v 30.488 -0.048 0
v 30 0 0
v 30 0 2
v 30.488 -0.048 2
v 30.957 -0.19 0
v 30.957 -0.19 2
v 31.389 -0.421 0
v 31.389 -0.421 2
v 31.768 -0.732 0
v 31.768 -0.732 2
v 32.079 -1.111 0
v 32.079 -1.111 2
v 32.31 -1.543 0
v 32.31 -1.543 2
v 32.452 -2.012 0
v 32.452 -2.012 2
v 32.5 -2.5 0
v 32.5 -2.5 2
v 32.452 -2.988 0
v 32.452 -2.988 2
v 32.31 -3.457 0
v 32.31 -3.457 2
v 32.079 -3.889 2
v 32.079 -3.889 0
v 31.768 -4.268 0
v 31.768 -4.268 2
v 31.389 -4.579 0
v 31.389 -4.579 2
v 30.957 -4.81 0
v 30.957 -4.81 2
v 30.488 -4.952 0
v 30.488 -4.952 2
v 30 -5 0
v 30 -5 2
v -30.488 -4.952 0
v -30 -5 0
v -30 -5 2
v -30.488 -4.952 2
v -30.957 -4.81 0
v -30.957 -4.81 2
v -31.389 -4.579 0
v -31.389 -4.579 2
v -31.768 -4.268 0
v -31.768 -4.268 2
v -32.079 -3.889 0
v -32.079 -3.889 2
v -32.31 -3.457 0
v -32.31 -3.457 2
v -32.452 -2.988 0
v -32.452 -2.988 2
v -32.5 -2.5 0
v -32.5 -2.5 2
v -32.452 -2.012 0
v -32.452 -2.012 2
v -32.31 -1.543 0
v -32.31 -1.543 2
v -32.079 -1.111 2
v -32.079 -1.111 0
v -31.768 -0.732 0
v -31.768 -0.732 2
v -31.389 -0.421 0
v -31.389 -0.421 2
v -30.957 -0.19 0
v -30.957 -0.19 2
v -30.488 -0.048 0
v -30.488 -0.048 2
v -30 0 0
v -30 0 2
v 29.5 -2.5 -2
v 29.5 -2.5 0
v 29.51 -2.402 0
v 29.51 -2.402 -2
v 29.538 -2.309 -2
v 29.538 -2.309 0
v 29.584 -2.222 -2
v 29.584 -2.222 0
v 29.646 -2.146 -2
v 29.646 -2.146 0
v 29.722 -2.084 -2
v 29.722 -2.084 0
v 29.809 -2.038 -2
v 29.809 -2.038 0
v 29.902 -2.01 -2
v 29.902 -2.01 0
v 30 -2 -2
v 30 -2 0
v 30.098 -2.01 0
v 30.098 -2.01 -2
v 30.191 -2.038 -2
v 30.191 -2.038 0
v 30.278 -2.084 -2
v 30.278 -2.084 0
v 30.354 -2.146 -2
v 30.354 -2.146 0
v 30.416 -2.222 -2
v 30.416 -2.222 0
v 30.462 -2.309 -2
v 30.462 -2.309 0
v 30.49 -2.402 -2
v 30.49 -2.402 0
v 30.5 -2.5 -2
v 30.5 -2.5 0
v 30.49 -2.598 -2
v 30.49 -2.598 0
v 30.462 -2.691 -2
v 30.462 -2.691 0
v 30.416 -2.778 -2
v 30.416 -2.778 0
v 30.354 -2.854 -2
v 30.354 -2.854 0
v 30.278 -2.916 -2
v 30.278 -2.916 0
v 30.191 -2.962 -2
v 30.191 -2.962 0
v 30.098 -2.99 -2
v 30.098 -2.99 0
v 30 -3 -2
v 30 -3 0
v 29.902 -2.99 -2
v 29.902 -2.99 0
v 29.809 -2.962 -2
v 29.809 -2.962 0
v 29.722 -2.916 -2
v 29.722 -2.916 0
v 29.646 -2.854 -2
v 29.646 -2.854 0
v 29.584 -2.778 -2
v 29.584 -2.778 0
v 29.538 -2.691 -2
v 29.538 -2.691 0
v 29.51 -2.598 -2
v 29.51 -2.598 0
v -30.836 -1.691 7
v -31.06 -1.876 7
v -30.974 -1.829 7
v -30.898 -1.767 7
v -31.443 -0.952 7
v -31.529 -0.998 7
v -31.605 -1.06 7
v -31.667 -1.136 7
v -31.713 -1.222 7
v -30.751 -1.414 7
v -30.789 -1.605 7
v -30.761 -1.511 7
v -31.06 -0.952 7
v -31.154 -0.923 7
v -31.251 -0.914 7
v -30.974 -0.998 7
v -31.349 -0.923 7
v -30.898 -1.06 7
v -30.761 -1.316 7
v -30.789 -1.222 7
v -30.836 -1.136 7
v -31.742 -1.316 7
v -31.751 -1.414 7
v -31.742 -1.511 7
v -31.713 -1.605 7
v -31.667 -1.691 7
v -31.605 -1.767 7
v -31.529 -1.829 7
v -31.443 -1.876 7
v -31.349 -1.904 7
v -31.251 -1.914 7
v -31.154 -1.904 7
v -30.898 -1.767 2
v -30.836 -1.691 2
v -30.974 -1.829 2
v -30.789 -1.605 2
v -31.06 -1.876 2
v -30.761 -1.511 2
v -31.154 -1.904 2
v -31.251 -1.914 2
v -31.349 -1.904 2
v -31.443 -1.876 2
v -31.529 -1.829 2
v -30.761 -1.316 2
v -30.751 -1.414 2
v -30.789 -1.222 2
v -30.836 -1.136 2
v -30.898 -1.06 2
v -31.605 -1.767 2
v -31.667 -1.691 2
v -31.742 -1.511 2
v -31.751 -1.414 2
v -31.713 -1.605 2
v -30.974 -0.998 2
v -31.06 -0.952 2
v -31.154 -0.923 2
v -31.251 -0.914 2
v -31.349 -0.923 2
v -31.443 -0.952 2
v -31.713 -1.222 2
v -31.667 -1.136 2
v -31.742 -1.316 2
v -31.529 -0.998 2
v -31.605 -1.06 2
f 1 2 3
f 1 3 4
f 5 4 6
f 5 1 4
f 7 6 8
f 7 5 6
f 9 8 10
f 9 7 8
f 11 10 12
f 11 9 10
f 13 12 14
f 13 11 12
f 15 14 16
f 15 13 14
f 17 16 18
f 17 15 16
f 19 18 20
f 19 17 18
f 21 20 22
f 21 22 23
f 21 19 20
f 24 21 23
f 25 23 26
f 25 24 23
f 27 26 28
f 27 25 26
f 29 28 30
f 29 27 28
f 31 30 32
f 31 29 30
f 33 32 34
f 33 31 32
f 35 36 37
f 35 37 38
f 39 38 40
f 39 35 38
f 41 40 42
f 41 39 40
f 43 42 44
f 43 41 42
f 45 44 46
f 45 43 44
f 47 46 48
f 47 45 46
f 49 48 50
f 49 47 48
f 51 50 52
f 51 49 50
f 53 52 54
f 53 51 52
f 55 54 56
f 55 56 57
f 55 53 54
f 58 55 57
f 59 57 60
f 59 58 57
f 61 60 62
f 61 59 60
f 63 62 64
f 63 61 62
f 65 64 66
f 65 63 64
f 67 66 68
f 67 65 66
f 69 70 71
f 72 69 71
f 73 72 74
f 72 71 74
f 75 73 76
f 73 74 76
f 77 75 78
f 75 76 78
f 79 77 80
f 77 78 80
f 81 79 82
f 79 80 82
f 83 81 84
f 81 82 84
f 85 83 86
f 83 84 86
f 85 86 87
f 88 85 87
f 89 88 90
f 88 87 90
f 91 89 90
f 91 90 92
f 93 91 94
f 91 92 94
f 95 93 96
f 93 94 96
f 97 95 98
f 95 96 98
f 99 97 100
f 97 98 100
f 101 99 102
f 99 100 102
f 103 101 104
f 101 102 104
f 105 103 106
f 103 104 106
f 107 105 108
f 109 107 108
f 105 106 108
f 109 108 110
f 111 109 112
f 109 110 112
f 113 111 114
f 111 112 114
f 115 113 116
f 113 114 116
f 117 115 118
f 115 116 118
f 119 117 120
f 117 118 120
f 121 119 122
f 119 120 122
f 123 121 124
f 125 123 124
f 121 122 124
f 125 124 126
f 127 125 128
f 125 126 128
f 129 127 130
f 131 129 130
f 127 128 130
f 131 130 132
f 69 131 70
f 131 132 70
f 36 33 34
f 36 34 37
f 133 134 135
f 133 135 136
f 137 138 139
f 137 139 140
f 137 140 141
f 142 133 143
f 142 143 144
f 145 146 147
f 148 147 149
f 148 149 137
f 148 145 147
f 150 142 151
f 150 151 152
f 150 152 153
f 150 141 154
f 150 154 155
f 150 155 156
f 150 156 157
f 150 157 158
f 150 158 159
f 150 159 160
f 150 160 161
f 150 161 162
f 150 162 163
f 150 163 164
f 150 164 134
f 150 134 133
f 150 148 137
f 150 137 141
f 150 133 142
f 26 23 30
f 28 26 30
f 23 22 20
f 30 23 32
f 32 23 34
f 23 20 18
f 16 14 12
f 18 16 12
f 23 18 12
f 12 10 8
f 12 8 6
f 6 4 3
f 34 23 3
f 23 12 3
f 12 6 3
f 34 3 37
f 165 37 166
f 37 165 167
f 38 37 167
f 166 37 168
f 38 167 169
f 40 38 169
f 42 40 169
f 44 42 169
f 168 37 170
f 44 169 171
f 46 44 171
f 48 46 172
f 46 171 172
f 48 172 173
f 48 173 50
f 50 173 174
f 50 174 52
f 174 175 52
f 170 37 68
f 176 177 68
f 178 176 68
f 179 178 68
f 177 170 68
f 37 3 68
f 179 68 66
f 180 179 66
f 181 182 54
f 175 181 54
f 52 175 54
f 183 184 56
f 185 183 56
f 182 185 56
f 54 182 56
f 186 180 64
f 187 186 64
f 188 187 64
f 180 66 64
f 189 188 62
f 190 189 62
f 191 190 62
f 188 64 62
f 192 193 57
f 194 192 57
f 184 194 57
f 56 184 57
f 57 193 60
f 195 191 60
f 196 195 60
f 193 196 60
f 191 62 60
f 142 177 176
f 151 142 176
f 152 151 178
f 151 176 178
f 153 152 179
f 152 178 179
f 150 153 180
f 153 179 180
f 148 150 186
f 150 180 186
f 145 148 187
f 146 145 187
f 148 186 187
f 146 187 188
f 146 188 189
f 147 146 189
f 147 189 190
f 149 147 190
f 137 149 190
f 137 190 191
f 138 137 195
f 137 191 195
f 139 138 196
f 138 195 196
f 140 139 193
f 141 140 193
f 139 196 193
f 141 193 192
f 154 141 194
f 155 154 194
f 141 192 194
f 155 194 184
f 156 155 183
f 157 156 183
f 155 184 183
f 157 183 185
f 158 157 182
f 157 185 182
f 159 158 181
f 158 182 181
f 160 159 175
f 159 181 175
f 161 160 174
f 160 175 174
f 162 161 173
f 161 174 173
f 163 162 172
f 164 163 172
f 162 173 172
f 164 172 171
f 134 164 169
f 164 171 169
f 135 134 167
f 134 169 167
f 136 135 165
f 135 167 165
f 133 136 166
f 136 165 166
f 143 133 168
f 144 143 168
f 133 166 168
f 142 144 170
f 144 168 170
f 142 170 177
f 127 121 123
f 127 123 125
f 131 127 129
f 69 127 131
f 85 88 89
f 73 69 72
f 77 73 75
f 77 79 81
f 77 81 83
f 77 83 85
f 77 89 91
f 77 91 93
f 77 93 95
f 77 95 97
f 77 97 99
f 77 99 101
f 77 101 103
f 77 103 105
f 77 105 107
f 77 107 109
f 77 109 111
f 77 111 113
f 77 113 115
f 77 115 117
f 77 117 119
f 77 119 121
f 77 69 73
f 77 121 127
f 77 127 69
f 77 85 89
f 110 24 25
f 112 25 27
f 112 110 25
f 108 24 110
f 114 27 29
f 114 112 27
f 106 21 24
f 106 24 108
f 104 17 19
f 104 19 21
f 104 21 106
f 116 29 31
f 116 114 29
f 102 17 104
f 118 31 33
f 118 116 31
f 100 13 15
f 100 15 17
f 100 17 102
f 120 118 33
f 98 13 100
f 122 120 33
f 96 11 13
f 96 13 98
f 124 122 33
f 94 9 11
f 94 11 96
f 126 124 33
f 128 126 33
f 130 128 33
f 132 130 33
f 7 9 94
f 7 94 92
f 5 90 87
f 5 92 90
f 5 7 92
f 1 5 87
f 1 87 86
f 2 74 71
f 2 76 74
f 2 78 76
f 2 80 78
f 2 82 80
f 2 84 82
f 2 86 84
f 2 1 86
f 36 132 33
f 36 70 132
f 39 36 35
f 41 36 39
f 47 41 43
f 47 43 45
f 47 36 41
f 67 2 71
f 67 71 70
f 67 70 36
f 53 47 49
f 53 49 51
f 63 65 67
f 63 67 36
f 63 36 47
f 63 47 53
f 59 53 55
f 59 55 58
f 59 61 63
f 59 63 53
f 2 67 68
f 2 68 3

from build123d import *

# Parameters (mm, degrees)
BOSS_EXTRUDE1_DEPTH = 2
SKETCH2_R           = 0.5
BOSS_EXTRUDE2_DEPTH = 2
SKETCH3_R           = 0.5
BOSS_EXTRUDE3_DEPTH = 5


with BuildPart() as part:
    # Sketch1 → Boss-Extrude1 (new body)
    with BuildSketch(Plane.XY):
        with BuildLine():
            Line((-30, 0), (30, 0))
            ThreePointArc((30, 0), (32.5, -2.5), (30, -5))
            Line((30, -5), (-30, -5))
            ThreePointArc((-30, -5), (-32.5, -2.5), (-30, 0))
        make_face()
    extrude(amount=BOSS_EXTRUDE1_DEPTH)

    # Sketch2 → Boss-Extrude2 (add)
    with BuildSketch(Plane(origin=(0, 0, 0), x_dir=(-1, 0, 0), z_dir=(0, 0, -1))):
        with Locations((-30, -2.5)):
            Circle(SKETCH2_R)
    extrude(amount=BOSS_EXTRUDE2_DEPTH)

    # Sketch3 → Boss-Extrude3 (add)
    with BuildSketch(Plane.XY.offset(2)):
        with Locations((-31.251389827, -1.413693431)):
            Circle(SKETCH3_R)
    extrude(amount=BOSS_EXTRUDE3_DEPTH)


solid = part.part
